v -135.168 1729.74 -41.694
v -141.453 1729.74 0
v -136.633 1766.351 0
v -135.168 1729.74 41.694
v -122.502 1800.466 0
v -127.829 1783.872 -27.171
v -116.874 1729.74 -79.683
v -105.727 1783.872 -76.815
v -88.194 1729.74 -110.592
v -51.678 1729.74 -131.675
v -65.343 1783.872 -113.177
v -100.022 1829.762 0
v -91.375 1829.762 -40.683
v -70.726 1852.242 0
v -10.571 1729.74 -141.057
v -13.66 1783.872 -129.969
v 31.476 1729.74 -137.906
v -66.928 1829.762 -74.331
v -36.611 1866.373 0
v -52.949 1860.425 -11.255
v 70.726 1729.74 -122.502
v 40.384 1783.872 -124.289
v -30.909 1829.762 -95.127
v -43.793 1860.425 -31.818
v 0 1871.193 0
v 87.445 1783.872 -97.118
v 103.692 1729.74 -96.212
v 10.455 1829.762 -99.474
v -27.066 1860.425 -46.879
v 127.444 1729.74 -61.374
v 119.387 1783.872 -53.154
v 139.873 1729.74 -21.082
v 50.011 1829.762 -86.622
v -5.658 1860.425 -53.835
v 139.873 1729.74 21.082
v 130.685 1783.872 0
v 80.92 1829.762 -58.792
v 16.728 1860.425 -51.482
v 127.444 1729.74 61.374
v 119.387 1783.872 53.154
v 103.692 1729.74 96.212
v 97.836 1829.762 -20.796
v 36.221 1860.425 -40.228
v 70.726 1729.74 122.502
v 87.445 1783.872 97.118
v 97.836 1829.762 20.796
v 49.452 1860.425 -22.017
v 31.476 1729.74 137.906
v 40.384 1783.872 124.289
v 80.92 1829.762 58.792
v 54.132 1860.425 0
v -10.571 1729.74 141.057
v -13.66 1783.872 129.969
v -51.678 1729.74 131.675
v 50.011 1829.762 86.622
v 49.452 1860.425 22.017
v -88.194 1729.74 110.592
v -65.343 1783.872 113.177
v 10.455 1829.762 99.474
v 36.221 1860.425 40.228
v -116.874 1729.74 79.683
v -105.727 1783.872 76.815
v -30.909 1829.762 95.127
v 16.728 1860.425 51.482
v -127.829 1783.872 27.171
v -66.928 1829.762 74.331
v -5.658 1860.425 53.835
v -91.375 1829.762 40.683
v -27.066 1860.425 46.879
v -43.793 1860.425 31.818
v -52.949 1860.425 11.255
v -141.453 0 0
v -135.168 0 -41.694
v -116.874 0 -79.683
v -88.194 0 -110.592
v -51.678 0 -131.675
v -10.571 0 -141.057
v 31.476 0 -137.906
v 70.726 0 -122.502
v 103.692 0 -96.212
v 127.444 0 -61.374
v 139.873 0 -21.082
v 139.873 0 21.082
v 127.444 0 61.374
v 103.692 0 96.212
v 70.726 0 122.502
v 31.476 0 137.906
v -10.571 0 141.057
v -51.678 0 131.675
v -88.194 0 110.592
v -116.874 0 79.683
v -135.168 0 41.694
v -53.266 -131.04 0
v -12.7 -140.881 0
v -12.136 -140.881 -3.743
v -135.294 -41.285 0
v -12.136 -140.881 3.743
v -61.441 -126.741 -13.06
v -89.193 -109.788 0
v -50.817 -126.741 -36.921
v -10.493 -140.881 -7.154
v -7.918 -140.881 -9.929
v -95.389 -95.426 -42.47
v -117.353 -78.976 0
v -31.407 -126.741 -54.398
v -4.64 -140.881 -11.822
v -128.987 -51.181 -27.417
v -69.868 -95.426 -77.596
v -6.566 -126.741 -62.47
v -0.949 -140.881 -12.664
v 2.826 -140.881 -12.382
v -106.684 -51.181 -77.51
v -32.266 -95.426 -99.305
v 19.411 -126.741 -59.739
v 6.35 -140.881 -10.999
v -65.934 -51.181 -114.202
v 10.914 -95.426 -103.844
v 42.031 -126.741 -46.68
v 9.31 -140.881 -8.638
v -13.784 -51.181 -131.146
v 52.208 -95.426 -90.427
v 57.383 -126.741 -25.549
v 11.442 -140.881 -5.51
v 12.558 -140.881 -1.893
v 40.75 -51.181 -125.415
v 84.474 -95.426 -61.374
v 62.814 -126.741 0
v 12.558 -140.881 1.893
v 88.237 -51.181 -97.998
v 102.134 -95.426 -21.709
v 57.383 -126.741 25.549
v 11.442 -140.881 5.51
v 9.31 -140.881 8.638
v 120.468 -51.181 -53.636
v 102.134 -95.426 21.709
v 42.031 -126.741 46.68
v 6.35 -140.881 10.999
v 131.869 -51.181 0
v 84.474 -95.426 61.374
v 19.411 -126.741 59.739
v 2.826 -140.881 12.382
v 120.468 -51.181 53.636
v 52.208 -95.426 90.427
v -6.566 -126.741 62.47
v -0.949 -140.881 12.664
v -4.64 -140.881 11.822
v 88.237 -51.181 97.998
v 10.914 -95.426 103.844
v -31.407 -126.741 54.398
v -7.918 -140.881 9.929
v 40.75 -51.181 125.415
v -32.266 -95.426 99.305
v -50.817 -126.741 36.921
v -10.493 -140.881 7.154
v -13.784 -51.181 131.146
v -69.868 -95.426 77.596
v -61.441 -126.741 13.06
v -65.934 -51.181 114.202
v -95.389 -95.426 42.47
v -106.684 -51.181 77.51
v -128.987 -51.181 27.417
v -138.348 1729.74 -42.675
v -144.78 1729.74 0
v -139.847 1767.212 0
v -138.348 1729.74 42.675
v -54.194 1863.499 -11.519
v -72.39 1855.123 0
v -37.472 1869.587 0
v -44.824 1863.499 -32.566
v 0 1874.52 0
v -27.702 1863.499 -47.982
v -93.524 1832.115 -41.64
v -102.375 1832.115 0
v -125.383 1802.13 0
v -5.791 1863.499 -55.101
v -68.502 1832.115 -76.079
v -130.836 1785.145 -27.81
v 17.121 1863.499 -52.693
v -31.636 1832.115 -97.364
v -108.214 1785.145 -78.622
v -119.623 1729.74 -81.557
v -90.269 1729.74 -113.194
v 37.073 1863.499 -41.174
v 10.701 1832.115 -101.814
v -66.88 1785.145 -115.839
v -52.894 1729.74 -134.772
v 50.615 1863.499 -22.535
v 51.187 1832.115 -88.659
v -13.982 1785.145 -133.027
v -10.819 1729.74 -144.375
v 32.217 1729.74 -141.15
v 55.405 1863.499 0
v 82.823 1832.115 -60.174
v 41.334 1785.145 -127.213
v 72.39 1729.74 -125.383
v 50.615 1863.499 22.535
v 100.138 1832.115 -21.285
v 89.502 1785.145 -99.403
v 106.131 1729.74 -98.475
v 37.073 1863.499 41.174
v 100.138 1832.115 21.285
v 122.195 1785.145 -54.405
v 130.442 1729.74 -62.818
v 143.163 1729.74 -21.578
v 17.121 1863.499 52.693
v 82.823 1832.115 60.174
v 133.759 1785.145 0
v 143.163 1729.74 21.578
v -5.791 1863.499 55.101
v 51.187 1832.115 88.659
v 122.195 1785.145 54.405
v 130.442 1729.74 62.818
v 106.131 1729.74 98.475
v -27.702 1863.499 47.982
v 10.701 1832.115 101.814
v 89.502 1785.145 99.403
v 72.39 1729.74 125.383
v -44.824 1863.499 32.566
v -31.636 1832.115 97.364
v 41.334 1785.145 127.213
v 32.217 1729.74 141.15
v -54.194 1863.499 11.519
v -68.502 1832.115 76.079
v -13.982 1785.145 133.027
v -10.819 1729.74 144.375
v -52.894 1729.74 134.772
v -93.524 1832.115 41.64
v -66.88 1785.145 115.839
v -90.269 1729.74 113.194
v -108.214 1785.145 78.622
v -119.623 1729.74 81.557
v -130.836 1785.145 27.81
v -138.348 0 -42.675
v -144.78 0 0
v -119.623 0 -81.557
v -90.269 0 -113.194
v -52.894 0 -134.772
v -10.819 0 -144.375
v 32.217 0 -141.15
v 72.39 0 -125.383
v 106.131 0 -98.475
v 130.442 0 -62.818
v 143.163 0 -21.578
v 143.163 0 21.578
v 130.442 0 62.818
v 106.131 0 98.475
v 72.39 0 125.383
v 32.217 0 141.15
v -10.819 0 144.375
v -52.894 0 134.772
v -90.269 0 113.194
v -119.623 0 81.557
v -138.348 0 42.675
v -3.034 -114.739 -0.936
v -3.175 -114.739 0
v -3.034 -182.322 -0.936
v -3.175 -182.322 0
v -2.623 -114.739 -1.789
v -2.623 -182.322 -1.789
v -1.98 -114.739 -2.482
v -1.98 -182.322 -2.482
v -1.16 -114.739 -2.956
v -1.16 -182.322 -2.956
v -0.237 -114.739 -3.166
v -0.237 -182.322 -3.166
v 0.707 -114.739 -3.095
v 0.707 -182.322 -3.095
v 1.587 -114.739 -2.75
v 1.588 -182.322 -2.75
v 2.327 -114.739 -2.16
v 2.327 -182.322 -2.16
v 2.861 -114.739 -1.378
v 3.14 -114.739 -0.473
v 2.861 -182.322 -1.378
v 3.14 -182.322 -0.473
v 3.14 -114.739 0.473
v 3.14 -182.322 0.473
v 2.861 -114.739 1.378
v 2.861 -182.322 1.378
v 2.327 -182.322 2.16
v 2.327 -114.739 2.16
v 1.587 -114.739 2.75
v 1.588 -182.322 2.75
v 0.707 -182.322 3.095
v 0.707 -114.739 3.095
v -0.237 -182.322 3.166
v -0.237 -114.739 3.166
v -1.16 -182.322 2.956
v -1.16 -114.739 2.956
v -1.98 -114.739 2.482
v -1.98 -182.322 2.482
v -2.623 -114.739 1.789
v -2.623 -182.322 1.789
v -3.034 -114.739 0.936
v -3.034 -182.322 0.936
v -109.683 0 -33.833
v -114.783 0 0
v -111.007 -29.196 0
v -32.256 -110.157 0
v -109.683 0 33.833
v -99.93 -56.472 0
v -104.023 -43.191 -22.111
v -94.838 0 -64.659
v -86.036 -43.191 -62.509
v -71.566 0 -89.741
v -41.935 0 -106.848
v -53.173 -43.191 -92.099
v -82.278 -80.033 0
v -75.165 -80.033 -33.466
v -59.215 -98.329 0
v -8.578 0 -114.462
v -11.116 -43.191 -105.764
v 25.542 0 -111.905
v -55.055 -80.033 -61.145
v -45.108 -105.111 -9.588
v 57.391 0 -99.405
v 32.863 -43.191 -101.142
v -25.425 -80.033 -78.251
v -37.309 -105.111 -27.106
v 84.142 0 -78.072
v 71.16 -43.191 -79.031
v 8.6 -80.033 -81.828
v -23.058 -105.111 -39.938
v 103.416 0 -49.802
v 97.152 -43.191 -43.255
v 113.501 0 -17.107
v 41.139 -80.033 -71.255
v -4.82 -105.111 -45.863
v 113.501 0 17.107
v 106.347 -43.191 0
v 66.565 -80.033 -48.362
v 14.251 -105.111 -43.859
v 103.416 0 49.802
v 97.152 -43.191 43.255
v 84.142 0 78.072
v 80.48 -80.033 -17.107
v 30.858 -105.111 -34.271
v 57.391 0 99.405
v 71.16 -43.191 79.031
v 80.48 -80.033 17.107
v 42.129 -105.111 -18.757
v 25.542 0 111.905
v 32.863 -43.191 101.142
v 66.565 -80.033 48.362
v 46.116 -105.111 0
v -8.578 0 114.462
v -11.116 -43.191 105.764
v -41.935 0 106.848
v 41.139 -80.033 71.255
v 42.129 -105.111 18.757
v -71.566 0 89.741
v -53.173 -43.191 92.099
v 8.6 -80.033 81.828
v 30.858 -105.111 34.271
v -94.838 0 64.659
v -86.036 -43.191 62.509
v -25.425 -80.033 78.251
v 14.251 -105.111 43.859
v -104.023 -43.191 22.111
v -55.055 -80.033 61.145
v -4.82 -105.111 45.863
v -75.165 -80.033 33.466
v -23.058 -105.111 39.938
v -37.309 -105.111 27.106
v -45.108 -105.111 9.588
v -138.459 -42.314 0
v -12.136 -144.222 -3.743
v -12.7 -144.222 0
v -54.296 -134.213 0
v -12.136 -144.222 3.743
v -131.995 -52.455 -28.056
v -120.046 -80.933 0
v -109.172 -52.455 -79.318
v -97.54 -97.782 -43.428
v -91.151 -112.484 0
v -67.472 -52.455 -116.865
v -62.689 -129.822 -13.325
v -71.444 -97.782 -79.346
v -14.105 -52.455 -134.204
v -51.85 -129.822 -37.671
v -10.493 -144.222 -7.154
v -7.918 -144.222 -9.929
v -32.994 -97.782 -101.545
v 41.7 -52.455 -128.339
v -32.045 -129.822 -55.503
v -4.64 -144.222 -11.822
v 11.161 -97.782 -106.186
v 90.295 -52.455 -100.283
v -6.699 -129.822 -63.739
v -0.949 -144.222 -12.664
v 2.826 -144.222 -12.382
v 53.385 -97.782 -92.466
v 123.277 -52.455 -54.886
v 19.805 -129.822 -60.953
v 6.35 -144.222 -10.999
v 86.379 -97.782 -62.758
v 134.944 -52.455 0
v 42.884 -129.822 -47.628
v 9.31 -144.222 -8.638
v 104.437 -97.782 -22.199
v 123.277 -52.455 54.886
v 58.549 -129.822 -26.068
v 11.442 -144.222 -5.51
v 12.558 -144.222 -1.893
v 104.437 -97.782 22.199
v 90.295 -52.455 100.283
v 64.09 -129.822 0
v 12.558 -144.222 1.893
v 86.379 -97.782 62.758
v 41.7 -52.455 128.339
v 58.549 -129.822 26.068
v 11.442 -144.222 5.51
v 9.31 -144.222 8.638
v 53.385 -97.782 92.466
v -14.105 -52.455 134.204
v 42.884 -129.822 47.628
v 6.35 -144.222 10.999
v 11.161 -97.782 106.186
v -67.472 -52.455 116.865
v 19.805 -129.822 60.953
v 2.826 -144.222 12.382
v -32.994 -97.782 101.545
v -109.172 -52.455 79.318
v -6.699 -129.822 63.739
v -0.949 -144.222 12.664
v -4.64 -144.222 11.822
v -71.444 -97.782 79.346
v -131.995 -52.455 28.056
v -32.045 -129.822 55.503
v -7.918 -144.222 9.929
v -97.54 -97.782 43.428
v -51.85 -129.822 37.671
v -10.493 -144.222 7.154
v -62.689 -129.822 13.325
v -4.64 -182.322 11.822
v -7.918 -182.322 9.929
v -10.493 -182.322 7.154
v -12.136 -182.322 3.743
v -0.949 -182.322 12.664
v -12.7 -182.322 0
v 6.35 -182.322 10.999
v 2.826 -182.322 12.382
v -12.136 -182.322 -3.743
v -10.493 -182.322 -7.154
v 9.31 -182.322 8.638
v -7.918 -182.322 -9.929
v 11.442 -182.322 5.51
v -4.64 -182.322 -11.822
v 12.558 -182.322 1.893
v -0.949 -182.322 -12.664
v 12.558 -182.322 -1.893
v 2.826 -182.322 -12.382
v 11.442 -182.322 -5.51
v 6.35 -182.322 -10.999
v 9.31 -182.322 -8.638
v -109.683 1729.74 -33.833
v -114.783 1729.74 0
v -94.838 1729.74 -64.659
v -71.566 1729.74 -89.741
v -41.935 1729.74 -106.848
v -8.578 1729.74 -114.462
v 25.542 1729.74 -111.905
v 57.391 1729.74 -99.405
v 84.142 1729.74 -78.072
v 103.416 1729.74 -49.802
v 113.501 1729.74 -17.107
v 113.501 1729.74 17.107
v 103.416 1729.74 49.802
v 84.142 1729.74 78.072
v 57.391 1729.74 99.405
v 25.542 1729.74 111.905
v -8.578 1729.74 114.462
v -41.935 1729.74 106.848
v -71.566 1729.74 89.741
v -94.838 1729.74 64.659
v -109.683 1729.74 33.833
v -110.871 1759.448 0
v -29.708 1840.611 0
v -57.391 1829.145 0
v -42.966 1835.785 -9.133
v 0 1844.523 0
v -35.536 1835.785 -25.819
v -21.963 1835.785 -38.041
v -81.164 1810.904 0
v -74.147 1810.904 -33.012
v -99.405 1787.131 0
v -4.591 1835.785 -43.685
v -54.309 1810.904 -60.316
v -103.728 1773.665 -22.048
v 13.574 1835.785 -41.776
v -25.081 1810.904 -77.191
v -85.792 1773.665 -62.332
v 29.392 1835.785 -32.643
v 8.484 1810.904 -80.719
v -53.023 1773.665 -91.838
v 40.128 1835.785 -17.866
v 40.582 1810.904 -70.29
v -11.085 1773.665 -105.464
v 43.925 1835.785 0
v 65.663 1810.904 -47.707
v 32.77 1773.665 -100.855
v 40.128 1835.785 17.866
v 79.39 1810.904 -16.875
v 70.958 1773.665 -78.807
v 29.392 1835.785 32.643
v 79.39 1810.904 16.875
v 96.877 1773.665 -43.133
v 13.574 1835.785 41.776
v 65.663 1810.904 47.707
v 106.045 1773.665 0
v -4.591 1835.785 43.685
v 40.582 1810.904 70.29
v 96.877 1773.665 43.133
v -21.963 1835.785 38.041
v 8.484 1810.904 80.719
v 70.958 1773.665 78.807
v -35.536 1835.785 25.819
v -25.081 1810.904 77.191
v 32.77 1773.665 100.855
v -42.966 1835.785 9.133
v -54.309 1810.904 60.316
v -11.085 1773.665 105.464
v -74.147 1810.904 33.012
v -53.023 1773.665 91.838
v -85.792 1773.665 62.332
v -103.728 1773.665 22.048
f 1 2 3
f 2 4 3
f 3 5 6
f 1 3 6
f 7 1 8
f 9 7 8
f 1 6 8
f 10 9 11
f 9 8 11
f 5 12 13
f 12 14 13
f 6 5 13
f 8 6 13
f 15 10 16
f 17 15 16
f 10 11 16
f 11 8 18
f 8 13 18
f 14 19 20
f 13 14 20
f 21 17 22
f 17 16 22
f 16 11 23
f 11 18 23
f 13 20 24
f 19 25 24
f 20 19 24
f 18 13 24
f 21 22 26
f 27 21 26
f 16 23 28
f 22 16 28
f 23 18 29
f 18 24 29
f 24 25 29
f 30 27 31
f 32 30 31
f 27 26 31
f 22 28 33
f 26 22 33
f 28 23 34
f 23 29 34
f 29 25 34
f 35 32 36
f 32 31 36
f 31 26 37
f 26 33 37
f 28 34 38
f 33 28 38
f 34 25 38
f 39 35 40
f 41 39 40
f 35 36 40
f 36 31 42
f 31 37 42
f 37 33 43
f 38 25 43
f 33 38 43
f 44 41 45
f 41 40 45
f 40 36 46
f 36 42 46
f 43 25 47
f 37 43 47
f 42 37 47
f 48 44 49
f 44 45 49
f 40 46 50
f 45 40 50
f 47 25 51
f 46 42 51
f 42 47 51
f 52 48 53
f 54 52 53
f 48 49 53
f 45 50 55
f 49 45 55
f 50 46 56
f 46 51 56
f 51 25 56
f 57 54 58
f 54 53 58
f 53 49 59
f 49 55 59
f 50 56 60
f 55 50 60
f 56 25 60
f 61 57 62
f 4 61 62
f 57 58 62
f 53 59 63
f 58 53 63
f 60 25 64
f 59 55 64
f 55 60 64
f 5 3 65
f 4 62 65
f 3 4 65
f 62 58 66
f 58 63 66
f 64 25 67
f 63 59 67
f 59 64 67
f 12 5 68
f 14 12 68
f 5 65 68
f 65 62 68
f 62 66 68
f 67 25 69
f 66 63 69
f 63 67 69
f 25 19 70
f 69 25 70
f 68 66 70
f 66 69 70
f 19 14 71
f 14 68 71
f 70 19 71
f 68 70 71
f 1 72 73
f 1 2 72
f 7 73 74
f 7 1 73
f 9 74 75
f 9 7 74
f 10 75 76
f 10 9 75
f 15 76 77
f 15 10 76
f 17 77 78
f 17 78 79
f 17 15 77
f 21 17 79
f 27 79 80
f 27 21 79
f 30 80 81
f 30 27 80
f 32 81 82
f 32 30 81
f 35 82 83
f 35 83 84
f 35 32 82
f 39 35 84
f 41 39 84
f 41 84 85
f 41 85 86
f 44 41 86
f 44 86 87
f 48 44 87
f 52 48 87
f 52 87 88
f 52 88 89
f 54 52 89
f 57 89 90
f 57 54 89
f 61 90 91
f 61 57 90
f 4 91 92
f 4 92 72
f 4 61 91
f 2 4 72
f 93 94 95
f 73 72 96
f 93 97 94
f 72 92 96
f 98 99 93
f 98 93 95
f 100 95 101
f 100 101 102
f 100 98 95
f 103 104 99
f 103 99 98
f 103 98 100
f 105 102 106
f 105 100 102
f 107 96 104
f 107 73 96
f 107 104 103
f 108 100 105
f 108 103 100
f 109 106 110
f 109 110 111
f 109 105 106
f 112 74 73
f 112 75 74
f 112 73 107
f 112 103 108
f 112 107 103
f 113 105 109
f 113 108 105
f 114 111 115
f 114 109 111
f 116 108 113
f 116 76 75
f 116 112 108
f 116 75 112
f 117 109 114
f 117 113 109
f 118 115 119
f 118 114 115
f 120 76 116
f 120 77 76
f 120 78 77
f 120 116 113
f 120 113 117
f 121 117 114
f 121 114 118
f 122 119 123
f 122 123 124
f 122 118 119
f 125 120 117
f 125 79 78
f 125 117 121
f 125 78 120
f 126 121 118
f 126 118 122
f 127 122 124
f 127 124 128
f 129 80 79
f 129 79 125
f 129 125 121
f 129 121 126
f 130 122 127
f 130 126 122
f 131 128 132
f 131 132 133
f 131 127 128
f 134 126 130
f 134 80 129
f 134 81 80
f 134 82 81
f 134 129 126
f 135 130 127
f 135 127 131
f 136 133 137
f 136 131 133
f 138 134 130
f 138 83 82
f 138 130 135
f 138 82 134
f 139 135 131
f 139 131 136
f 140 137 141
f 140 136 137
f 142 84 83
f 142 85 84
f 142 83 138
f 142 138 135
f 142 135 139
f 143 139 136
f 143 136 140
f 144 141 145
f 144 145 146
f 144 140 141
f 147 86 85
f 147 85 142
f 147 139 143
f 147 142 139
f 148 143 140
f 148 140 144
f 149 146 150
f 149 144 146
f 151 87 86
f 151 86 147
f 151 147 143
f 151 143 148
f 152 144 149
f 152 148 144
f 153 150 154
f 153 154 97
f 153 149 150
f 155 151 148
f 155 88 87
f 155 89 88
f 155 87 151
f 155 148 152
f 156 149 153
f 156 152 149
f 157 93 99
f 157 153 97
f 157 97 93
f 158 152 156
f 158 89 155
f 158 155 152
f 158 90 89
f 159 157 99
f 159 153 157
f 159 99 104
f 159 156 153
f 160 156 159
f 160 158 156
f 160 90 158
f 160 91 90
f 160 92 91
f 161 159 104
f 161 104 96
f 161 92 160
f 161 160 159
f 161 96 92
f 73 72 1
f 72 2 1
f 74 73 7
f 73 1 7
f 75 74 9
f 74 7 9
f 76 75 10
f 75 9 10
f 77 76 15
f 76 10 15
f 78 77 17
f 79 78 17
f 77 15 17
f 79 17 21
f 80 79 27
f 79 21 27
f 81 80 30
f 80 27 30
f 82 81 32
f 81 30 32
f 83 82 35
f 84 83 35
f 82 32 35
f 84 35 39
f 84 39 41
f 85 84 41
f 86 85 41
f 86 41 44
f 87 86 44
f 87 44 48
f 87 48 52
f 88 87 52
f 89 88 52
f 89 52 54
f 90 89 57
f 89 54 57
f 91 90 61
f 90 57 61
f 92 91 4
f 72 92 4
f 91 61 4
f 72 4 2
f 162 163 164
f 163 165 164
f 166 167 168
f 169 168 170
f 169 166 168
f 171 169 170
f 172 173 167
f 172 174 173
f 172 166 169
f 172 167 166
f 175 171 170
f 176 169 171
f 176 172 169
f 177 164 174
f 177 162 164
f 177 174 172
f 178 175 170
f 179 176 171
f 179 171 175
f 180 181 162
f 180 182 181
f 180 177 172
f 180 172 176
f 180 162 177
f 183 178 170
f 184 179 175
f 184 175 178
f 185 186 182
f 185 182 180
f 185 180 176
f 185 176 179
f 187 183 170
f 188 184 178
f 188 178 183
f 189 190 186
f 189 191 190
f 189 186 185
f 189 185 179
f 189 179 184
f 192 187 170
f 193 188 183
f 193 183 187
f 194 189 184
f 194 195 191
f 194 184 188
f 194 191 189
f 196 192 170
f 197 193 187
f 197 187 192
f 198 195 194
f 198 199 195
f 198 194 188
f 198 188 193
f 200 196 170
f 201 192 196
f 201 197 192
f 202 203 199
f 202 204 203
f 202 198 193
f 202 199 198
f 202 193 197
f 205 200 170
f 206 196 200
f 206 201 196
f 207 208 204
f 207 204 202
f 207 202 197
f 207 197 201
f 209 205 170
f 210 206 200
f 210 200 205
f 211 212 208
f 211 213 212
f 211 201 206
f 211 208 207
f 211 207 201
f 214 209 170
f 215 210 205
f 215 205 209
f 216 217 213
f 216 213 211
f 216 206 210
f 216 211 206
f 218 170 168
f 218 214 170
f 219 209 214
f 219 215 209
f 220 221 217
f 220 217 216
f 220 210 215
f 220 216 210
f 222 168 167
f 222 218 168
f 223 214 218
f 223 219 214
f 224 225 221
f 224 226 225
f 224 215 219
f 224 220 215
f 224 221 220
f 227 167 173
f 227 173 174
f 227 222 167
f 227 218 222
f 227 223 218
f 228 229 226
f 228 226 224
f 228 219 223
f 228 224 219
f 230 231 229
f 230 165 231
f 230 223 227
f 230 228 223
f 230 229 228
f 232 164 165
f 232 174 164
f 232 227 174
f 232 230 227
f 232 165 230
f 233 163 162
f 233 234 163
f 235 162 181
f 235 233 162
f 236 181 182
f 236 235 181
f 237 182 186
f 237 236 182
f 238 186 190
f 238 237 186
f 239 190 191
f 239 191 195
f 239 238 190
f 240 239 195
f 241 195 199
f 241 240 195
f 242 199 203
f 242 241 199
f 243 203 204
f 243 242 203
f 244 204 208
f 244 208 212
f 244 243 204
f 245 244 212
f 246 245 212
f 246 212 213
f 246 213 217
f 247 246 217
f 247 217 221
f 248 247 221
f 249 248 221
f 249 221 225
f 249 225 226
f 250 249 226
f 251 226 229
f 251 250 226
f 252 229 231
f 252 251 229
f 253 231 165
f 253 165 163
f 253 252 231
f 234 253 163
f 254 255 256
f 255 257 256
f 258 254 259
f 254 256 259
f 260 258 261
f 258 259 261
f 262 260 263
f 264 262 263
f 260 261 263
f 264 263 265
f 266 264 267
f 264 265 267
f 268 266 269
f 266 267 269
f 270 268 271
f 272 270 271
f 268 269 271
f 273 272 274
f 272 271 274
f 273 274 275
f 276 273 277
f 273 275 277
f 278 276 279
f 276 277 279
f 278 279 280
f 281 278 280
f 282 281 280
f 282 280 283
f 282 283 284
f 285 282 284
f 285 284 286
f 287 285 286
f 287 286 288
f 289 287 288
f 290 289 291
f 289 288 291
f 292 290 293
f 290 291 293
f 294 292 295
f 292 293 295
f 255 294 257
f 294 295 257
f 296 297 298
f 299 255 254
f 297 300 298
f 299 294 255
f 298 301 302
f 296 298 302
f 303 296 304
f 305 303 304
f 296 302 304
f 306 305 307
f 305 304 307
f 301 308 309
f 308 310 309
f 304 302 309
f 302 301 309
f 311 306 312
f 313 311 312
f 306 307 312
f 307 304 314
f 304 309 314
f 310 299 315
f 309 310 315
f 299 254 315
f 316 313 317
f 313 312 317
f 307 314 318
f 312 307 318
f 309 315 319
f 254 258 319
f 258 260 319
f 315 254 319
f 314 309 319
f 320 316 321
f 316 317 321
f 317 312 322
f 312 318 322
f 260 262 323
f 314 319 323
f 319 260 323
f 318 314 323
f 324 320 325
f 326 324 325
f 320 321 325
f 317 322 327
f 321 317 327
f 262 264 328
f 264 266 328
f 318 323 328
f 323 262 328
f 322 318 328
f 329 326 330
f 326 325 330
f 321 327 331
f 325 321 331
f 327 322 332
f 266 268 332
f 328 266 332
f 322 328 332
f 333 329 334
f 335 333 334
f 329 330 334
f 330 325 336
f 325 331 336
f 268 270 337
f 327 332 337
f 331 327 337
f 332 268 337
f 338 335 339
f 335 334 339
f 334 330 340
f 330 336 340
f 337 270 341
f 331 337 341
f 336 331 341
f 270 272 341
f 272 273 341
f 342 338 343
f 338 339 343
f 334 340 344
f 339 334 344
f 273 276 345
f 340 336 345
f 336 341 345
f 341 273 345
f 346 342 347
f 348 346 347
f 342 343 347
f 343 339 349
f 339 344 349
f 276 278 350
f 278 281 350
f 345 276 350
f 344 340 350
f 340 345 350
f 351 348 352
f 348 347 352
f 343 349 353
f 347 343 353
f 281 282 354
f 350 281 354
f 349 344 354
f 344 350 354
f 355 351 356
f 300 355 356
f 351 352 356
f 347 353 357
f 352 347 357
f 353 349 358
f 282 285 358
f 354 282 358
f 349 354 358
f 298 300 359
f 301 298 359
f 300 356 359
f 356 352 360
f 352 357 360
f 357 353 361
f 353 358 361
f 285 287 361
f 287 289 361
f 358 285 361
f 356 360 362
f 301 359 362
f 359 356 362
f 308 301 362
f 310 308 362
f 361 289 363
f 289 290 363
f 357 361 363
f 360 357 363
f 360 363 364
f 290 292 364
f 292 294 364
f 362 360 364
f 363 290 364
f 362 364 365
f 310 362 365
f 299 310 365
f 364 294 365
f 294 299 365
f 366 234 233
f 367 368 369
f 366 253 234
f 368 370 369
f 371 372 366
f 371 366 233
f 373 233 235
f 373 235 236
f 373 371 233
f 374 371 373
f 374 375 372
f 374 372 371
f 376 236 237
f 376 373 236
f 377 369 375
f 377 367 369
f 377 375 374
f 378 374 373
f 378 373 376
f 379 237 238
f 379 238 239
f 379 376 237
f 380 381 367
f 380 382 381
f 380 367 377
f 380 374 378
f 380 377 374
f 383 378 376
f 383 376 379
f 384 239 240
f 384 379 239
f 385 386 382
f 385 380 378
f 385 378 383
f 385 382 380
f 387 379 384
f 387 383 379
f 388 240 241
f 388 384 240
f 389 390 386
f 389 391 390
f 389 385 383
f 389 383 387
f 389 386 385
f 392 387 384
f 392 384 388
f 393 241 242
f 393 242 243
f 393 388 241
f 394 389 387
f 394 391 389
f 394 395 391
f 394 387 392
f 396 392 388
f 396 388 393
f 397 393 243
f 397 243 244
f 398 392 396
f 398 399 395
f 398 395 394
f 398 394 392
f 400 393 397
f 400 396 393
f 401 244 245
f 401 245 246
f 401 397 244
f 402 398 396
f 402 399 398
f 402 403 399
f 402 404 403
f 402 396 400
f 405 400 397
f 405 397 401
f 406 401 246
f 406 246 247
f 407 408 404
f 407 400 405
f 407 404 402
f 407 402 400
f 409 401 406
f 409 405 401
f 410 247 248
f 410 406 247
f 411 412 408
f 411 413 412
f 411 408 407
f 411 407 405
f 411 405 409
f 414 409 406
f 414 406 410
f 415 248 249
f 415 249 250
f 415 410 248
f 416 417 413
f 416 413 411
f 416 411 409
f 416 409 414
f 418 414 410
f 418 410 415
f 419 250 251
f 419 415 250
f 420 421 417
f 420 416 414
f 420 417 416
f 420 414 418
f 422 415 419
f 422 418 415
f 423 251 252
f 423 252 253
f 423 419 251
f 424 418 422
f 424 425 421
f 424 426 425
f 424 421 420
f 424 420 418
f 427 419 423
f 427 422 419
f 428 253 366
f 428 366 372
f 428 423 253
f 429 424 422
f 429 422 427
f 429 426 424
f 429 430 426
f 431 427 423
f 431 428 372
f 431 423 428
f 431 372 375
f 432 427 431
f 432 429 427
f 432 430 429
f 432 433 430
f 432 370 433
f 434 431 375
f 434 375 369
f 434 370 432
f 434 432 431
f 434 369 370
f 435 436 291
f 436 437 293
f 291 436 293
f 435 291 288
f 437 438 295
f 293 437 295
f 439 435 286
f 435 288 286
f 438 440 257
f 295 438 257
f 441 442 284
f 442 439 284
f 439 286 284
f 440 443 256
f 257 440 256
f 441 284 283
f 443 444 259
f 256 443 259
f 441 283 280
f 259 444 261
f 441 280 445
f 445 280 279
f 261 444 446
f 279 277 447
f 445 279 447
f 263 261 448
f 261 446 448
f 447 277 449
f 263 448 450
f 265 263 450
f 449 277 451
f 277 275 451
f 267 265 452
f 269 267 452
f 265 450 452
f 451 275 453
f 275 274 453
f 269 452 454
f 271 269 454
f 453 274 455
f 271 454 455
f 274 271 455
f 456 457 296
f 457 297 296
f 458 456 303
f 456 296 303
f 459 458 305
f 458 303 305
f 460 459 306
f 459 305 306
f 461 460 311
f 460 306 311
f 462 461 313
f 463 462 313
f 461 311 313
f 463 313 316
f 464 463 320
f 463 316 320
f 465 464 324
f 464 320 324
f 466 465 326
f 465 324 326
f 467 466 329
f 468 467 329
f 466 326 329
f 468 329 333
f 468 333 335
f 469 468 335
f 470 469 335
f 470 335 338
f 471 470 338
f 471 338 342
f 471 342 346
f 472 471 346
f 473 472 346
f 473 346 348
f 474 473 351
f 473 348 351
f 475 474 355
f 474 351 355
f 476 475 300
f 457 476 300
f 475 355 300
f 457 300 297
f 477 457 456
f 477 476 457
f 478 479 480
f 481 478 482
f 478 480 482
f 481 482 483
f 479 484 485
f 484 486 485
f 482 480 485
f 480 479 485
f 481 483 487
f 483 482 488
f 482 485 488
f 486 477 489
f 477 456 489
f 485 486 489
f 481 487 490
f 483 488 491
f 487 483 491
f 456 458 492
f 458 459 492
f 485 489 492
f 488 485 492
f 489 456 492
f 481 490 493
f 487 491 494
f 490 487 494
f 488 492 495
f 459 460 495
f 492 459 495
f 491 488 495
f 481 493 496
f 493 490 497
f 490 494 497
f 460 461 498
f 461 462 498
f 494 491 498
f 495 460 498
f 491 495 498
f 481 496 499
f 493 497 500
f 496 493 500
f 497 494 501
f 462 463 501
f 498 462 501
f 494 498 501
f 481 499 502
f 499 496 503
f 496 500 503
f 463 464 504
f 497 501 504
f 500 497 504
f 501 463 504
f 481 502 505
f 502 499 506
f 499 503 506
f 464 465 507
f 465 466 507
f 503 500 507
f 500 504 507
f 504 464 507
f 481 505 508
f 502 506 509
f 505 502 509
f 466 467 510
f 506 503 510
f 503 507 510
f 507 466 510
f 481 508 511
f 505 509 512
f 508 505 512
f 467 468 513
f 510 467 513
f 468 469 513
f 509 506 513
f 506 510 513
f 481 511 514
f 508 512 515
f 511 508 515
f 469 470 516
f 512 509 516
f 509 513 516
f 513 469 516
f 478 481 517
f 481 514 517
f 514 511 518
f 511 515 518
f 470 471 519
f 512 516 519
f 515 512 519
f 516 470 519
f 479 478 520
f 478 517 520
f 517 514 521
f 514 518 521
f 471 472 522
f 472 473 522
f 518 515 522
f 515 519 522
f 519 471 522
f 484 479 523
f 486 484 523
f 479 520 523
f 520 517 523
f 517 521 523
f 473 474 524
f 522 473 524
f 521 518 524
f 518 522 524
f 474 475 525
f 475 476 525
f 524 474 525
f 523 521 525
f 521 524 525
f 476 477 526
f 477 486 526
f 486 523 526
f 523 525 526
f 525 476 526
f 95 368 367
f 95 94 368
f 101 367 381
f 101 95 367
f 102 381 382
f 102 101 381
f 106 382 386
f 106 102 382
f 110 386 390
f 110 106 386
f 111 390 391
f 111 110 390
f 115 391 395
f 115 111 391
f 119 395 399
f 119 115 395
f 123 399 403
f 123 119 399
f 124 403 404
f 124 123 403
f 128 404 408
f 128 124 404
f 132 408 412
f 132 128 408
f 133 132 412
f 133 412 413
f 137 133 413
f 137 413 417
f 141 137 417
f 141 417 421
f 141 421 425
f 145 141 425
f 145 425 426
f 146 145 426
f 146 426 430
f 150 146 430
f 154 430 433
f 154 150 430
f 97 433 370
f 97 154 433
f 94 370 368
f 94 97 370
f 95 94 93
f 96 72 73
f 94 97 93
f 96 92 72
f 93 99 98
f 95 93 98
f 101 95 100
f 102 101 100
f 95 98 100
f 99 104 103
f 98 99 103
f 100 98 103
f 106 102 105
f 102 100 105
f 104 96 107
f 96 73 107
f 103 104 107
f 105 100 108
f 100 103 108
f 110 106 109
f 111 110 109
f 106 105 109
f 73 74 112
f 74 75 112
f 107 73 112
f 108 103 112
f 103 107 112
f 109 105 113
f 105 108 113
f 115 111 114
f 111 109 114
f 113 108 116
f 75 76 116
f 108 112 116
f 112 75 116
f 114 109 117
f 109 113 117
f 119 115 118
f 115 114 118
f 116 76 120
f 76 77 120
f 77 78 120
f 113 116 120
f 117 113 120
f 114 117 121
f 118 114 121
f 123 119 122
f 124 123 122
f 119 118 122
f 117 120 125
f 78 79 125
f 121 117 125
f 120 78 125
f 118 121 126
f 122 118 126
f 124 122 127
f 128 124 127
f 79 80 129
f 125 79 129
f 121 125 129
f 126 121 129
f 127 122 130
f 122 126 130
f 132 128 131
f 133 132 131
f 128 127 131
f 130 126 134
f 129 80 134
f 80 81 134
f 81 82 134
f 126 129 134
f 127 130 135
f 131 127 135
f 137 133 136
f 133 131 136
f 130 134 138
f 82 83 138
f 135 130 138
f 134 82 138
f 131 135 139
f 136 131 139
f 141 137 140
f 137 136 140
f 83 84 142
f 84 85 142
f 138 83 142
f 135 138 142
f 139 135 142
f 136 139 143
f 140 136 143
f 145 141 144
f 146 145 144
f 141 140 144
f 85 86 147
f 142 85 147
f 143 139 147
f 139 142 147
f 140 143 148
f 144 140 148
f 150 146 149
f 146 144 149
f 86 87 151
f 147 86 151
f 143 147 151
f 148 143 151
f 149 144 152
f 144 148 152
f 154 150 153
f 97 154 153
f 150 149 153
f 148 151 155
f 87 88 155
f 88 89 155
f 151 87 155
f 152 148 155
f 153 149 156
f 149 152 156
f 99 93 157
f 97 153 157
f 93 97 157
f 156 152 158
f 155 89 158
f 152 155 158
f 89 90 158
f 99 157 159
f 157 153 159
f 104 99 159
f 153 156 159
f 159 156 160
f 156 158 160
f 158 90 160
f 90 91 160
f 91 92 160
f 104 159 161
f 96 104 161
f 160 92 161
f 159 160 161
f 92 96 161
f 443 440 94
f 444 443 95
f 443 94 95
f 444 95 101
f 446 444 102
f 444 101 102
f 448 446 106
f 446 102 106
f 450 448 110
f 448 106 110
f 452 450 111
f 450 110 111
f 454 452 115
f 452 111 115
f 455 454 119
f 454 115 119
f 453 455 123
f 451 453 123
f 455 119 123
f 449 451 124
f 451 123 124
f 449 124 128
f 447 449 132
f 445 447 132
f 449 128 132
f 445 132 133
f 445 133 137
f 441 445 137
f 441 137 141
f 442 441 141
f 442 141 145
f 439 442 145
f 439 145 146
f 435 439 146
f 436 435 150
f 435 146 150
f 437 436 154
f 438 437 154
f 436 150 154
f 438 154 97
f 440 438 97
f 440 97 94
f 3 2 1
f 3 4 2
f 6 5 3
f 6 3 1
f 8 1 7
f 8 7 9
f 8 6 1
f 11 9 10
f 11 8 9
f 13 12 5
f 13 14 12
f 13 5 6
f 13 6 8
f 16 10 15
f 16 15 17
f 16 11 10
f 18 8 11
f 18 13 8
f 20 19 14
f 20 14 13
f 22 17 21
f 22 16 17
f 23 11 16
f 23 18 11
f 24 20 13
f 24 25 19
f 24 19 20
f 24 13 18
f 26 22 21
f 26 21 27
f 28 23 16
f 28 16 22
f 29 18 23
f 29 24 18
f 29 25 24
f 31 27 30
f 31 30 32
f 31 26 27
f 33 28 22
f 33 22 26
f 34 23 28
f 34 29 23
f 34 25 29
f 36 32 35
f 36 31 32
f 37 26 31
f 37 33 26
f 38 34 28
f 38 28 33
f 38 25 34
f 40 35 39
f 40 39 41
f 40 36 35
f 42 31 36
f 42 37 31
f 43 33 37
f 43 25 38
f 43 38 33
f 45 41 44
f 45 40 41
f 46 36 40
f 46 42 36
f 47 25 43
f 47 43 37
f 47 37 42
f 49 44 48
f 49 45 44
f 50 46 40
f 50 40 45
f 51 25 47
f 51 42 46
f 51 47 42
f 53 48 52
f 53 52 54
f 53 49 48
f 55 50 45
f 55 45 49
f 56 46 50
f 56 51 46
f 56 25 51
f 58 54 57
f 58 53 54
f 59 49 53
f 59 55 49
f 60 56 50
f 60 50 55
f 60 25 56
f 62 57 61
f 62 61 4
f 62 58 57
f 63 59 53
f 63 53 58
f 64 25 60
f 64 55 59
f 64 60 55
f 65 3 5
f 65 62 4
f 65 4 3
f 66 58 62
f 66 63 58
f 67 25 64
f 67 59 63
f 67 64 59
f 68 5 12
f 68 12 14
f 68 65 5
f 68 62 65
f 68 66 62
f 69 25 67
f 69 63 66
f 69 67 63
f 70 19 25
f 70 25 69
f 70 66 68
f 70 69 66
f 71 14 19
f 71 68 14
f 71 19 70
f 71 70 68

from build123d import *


with BuildPart() as part:
    # Sketch1 (on Front Plane) → Revolve1 (revolve)
    with BuildSketch(Plane.XY):
        with BuildLine():
            Line((-114.7826, 1729.74), (-114.7826, 0))
            ThreePointArc((-114.7826, 0), (-82.278429791, -80.033150968), (-3.175, -114.73867978))
            Line((-3.175, -114.73867978), (-3.175, -182.321906796))
            Line((-3.175, -182.321906796), (-12.7, -182.321906796))
            Line((-12.7, -182.321906796), (-12.7, -140.881326111))
            ThreePointArc((-12.7, -140.881326111), (-104.415722156, -95.42638531), (-141.4526, 0))
            Line((-141.4526, 0), (-141.4526, 1729.74))
            ThreePointArc((-141.4526, 1729.74), (-100.022092676, 1829.762092676), (0, 1871.1926))
            Line((0, 1871.1926), (0, 1844.5226))
            ThreePointArc((0, 1844.5226), (-81.163554822, 1810.903554822), (-114.7826, 1729.74))
        make_face()
    revolve(axis=Axis((0, 50.358015581, 0), (0, -1, 0)))


with BuildPart() as body_2:
    # Sketch1<4> → Revolve2 (revolve)
    with BuildSketch(Plane.XY):
        with BuildLine():
            ThreePointArc((-141.4526, 1729.74), (-100.022092676, 1829.762092676), (0, 1871.1926))
            Line((0, 1871.1926), (0, 1874.52))
            ThreePointArc((0, 1874.52), (-102.37491978, 1832.11491978), (-144.78, 1729.74))
            Line((-144.78, 1729.74), (-144.78, 0))
            ThreePointArc((-144.78, 0), (-106.770675749, -97.781752899), (-12.7, -144.221906796))
            Line((-12.7, -144.221906796), (-12.7, -140.881326111))
            ThreePointArc((-12.7, -140.881326111), (-104.415722156, -95.42638531), (-141.4526, 0))
            Line((-141.4526, 0), (-141.4526, 1729.74))
        make_face()
    revolve(axis=Axis((0, 50.358015581, 0), (0, -1, 0)))


solid = Compound([part.part, body_2.part])
